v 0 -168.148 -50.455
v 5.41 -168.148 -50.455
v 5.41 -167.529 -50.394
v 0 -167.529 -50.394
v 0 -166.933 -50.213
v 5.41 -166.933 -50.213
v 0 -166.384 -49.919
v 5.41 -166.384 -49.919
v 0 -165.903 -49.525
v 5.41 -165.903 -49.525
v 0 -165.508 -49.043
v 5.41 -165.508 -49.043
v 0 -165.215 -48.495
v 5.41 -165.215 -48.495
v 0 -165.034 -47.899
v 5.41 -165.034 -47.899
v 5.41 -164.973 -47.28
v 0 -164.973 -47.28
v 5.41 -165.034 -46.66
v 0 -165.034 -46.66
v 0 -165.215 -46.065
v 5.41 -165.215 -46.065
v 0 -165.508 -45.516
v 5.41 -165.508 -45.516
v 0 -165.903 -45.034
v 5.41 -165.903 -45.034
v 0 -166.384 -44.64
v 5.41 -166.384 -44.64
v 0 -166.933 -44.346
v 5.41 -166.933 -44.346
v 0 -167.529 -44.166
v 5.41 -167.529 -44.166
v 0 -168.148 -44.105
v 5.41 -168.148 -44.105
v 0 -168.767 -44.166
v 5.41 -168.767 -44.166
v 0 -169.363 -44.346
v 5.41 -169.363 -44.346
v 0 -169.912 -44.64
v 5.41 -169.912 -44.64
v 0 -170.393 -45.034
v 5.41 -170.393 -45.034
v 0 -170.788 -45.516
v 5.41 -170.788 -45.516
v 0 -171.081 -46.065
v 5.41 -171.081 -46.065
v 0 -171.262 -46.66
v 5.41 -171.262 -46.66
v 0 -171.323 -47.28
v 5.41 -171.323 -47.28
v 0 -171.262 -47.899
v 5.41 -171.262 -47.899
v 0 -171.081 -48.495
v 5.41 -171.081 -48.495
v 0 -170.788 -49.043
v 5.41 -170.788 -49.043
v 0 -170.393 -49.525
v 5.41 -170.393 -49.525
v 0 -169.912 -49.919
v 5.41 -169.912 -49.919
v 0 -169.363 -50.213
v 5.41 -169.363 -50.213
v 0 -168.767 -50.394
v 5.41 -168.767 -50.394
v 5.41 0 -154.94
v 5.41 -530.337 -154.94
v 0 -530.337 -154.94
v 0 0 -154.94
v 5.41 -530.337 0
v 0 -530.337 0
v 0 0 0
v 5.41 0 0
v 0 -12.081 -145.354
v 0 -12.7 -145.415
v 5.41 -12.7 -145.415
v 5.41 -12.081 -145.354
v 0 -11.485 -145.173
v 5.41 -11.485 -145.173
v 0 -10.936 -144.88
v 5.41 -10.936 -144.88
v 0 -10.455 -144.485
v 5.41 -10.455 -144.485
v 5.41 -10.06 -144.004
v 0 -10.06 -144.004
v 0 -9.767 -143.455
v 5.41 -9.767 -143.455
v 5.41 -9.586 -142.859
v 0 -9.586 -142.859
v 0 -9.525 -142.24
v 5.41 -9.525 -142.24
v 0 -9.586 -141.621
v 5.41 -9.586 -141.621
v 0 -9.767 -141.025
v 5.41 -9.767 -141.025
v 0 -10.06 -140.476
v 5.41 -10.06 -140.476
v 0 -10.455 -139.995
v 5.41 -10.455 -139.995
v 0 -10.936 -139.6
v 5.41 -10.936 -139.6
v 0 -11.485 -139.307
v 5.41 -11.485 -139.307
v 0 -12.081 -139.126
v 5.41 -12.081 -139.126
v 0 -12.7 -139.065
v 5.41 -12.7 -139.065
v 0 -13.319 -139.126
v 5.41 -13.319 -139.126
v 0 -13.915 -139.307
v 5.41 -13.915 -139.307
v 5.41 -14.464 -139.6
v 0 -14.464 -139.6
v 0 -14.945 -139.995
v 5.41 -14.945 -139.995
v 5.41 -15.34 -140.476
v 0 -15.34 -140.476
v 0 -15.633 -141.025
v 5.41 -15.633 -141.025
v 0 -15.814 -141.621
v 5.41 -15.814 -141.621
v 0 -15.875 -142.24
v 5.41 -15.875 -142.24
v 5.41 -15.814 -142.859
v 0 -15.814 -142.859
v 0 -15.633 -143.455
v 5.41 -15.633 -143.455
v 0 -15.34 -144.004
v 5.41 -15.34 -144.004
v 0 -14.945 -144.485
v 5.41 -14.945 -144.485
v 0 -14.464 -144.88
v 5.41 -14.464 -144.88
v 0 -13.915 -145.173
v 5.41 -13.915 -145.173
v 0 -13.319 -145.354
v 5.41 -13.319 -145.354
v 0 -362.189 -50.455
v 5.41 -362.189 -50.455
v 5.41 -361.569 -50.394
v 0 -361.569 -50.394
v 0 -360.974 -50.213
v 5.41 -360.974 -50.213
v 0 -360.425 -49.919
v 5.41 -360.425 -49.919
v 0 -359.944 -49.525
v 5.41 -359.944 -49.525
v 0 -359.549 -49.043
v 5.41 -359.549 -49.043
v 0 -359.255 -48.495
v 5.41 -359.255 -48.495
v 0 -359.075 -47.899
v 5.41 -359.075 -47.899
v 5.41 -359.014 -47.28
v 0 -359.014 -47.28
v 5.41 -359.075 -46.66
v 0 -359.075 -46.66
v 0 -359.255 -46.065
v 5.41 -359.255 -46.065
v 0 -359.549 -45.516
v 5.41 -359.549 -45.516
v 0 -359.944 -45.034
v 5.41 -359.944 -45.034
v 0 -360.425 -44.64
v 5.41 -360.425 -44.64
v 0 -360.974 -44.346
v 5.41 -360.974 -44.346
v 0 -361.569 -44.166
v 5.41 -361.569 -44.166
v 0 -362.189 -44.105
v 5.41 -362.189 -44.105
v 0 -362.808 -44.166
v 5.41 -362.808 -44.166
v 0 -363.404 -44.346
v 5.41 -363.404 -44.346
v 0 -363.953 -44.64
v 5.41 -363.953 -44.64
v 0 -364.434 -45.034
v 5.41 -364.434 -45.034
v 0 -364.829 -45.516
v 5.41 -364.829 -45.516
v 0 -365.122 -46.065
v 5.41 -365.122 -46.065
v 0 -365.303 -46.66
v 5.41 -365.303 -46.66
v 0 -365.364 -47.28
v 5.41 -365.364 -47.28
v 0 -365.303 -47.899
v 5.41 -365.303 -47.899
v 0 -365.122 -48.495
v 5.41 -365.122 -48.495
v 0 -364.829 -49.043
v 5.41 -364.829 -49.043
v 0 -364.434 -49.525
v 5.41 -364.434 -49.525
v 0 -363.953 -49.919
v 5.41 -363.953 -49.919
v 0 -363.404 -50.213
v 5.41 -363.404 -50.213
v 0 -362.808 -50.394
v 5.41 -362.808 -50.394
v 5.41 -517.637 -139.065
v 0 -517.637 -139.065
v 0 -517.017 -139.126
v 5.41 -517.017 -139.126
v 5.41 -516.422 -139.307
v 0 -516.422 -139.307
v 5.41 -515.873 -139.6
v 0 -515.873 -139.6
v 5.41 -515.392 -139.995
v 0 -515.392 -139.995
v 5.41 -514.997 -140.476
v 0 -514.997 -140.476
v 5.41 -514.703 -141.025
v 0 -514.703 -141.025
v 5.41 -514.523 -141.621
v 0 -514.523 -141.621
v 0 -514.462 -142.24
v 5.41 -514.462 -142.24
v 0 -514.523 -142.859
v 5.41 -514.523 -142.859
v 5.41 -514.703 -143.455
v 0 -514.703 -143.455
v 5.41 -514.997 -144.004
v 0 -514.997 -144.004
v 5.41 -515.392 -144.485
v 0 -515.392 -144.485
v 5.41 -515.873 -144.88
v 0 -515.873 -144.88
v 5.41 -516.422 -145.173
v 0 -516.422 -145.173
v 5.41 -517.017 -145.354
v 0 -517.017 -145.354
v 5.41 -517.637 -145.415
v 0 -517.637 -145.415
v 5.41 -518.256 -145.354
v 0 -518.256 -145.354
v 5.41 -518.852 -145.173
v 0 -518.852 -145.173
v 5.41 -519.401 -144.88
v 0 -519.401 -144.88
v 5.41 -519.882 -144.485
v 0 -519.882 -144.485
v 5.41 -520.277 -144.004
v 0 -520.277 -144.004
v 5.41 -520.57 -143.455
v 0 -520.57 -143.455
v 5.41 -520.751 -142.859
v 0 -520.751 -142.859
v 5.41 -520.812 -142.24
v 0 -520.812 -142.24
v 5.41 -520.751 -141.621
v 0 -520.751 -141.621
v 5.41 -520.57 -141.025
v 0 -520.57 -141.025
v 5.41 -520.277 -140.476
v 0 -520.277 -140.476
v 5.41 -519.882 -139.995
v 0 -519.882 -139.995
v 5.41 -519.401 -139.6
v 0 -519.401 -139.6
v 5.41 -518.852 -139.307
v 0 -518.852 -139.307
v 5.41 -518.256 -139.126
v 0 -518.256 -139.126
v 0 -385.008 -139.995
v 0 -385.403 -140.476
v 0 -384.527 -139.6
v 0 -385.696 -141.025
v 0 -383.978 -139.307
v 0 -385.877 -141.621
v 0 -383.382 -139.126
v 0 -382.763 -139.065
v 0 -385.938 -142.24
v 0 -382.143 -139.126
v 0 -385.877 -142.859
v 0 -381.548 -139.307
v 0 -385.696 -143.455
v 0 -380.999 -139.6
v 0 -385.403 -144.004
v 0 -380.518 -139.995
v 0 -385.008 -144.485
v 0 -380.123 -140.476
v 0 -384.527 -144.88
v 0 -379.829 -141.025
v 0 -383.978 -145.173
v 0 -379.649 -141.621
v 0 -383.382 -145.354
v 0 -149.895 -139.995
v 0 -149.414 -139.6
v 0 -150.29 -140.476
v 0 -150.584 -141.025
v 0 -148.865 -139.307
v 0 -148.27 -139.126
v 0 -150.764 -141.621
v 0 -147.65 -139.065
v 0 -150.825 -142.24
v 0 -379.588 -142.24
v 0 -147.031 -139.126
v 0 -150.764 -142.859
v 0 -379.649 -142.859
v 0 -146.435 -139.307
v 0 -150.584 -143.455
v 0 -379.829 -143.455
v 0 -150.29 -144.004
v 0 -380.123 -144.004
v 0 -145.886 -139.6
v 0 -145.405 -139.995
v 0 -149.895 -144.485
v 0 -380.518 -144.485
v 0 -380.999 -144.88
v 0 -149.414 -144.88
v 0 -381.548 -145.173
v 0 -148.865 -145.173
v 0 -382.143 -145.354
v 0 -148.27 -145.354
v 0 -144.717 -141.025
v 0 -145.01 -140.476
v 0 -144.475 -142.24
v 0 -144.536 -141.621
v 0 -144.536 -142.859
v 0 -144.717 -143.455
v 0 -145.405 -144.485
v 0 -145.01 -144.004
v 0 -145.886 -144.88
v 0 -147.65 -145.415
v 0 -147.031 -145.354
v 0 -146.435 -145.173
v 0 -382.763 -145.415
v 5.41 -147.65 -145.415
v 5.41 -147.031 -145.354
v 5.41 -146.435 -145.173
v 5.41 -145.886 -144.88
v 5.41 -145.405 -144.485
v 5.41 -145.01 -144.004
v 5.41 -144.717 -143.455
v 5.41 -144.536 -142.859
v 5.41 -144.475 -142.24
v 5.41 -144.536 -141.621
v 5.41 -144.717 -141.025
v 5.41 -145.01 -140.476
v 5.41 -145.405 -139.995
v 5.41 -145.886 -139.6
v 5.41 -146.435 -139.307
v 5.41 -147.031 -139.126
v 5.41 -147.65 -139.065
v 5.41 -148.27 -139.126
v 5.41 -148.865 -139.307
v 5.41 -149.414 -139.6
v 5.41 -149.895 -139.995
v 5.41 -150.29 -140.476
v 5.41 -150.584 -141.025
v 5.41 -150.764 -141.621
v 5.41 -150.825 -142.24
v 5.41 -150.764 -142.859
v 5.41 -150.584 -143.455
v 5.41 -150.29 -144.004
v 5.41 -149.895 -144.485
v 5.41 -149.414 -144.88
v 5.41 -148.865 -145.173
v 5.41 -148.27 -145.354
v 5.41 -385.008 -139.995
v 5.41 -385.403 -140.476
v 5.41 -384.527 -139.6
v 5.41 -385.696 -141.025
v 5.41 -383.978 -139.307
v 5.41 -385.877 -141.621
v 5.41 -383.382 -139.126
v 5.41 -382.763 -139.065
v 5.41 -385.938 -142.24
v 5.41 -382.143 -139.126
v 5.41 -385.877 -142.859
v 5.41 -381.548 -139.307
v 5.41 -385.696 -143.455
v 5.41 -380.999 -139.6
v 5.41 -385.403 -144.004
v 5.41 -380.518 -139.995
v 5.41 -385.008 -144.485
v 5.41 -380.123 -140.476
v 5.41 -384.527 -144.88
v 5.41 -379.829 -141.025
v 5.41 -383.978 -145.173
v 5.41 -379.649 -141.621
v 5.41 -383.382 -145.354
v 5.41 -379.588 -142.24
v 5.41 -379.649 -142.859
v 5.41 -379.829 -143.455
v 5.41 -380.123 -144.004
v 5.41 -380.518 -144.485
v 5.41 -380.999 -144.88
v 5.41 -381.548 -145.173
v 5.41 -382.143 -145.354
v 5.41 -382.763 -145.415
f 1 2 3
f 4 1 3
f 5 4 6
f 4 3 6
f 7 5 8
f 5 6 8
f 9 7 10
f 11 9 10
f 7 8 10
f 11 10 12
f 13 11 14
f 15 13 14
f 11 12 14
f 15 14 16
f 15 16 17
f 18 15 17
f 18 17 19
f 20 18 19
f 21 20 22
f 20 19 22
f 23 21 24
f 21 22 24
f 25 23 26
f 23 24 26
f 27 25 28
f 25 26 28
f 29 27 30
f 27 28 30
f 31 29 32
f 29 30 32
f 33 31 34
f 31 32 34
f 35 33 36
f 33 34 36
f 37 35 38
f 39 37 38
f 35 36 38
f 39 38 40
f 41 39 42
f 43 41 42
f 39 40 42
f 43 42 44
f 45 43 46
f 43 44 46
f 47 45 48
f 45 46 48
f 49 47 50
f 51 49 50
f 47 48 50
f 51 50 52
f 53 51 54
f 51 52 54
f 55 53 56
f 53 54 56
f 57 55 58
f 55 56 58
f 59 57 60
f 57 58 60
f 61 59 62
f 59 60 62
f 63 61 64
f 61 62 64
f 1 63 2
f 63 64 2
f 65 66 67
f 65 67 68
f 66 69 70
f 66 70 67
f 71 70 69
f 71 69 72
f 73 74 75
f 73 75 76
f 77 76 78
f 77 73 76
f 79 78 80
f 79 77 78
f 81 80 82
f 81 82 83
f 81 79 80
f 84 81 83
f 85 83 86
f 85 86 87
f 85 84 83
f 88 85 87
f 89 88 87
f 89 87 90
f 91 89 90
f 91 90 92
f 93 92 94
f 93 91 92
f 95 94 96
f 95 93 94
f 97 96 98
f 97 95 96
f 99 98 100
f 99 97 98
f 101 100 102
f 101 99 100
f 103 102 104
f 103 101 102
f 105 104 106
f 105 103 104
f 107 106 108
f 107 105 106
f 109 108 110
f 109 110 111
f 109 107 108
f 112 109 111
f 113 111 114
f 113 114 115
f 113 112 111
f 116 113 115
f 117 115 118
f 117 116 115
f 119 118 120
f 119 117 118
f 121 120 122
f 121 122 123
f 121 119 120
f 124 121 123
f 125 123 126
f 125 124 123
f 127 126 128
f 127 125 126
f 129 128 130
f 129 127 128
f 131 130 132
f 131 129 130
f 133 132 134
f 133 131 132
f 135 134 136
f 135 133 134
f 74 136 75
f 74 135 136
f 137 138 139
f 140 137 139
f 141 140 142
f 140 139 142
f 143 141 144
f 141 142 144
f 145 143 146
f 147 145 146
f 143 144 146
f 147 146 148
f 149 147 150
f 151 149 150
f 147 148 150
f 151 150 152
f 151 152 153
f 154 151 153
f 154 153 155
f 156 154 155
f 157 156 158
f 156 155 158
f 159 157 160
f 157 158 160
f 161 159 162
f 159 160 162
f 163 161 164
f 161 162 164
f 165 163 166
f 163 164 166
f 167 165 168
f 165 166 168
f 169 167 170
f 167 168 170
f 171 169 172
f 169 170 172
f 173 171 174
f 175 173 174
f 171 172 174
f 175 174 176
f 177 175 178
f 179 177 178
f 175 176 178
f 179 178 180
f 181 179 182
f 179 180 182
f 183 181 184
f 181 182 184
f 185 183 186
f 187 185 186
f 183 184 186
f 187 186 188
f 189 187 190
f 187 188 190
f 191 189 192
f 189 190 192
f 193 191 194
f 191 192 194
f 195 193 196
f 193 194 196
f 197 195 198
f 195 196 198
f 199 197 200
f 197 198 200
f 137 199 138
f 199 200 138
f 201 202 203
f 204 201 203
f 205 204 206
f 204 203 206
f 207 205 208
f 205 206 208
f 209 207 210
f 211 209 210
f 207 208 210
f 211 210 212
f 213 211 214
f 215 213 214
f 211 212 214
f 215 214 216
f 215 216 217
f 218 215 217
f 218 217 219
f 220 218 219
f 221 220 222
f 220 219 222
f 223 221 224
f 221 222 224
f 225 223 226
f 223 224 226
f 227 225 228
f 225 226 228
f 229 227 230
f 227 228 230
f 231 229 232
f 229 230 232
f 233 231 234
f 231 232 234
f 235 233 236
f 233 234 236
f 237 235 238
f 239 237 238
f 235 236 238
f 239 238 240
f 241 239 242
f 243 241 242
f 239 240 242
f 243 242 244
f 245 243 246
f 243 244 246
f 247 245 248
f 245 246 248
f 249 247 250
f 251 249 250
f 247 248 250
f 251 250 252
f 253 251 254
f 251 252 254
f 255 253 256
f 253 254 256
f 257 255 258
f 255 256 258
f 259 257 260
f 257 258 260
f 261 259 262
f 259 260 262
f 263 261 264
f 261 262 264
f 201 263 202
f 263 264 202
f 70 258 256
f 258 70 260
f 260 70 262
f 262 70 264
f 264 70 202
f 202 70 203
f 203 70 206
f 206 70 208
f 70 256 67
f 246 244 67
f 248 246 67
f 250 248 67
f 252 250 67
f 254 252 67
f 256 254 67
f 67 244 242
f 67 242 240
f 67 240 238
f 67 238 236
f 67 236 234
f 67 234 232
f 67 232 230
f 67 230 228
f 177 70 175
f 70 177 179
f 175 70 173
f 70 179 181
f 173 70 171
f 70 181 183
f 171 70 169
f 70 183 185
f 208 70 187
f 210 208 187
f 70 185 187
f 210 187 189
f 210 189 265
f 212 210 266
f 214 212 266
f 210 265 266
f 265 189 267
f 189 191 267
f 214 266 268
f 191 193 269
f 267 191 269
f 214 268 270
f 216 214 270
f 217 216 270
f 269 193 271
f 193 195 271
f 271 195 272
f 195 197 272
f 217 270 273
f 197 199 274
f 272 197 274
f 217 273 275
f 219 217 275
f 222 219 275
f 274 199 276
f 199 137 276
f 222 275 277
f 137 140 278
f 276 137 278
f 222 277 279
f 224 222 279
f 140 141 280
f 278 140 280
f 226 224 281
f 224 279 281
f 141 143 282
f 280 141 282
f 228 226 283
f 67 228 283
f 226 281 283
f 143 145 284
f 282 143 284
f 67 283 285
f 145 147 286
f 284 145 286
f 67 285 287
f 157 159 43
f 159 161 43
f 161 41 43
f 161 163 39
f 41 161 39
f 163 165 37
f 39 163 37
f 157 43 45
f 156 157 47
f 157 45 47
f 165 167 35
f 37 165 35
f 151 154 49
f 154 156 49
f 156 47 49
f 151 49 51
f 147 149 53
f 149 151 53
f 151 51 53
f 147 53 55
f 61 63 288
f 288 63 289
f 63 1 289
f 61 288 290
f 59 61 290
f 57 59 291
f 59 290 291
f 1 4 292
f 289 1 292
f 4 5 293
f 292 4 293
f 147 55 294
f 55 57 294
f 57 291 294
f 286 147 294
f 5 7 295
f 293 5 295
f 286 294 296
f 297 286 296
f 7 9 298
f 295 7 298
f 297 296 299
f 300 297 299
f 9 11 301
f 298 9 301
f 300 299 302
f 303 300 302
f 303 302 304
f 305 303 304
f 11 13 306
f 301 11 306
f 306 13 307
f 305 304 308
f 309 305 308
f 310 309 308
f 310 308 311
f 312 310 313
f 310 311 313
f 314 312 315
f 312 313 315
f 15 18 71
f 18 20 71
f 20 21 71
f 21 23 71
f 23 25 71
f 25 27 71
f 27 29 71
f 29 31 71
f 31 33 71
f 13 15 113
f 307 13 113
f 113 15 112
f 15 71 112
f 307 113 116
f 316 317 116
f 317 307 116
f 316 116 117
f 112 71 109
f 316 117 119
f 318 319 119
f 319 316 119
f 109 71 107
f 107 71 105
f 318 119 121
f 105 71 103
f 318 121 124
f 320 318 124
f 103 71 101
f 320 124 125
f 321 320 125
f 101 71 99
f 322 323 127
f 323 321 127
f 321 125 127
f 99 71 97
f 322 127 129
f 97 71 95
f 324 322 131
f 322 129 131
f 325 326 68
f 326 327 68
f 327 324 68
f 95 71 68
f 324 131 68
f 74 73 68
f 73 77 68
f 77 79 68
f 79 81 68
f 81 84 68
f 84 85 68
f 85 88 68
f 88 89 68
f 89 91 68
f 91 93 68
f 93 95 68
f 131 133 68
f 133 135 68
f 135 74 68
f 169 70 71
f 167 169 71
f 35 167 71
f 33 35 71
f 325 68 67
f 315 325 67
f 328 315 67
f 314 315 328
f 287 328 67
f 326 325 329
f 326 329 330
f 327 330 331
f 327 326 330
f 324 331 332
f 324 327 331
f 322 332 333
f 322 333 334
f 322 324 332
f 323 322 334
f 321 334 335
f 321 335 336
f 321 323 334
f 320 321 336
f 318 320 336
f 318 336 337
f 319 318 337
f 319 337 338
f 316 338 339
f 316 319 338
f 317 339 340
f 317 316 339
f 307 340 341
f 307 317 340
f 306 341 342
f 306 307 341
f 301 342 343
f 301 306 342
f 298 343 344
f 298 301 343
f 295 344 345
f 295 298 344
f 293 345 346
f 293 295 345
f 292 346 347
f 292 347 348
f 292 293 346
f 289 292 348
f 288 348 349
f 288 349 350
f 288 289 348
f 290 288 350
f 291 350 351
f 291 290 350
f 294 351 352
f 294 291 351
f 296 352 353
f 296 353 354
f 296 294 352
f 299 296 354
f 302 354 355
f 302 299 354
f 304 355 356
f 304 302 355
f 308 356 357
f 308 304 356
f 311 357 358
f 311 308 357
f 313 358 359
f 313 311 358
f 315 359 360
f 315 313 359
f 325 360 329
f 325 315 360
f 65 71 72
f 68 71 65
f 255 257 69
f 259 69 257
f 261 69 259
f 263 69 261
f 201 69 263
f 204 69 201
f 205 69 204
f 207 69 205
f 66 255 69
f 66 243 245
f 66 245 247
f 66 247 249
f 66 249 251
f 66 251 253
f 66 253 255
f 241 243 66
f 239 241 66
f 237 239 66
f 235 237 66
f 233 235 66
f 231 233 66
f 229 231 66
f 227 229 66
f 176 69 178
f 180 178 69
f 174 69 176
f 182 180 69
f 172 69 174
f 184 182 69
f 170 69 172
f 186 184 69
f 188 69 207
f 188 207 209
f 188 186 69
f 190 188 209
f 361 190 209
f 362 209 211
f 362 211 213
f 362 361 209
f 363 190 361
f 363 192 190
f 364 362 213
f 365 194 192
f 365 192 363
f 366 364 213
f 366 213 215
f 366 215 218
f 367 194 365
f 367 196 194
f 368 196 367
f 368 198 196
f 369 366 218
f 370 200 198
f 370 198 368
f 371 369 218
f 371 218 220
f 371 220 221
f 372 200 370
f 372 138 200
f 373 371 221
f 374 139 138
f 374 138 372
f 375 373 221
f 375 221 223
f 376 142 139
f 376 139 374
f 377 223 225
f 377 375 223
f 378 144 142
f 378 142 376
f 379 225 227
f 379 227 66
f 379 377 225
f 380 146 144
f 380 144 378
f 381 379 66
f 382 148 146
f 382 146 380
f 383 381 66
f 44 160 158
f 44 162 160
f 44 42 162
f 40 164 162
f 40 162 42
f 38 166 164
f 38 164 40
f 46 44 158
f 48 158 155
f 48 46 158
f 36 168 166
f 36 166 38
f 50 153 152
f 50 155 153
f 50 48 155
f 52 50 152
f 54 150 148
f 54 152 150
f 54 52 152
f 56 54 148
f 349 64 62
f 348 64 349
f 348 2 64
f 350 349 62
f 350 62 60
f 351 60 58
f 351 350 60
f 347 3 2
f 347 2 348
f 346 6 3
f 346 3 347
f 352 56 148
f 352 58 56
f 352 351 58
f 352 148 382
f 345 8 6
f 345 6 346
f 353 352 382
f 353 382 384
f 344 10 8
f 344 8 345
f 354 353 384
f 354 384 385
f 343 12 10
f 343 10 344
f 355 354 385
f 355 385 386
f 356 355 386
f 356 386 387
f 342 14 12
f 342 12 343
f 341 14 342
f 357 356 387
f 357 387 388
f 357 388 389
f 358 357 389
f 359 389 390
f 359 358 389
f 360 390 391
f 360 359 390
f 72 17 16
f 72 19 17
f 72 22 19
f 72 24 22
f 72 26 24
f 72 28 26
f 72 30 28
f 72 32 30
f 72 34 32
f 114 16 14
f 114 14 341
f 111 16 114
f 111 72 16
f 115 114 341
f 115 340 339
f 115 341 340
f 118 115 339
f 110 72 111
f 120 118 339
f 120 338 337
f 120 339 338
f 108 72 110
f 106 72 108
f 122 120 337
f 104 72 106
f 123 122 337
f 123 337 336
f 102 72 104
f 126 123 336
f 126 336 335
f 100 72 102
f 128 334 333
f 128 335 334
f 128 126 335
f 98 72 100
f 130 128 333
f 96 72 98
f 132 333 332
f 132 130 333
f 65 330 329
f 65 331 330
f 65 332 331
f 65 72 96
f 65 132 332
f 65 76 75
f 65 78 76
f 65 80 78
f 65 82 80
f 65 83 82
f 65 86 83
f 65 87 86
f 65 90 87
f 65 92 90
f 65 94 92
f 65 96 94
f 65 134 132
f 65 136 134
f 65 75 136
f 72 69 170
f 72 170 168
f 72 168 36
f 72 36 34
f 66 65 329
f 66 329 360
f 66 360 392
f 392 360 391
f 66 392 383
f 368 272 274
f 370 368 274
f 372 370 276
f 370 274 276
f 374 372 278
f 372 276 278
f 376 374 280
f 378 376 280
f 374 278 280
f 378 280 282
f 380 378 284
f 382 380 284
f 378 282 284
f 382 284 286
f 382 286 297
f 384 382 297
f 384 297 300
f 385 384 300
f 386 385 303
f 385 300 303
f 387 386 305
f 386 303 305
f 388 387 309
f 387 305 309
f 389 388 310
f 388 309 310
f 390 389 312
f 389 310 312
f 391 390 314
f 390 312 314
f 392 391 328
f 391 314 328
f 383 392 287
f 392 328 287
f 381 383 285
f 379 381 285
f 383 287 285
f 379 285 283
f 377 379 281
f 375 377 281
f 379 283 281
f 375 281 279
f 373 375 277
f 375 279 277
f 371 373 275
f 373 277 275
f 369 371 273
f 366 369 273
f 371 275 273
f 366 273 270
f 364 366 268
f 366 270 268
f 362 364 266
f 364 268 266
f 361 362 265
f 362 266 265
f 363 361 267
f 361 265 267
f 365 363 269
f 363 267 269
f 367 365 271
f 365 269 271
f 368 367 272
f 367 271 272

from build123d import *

# Parameters (mm, degrees)
SKETCH1_W           = 163.28644
SKETCH1_H           = 160.3502
SKETCH1_R           = 3.175
BOSS_EXTRUDE3_DEPTH = 5.4102
SKETCH5_W           = 163.28644
SKETCH5_H           = 369.98656
SKETCH5_R           = 3.175
BOSS_EXTRUDE7_DEPTH = 5.4102
SKETCH6_W           = 8.34644
SKETCH6_H           = 530.33676
CUT_EXTRUDE1_DEPTH  = 5.4102
SKETCH7_R           = 3.175
CUT_EXTRUDE2_DEPTH  = 5.4102


with BuildPart() as part:
    # Sketch1 → Boss-Extrude3 (new body)
    with BuildSketch(Plane(origin=(0, 0, 0), x_dir=(0, 0, -1), z_dir=(1, 0, 0))):
        with Locations((73.29678, -80.1751)):
            Rectangle(SKETCH1_W, SKETCH1_H)
        with Locations((142.24, -147.6502)):
            Circle(SKETCH1_R, mode=Mode.SUBTRACT)
        with Locations((142.24, -12.7)):
            Circle(SKETCH1_R, mode=Mode.SUBTRACT)
    extrude(amount=BOSS_EXTRUDE3_DEPTH)

    # Sketch5 → Boss-Extrude7 (add)
    with BuildSketch(Plane(origin=(5.4102, 0, 0), x_dir=(0, 0, -1), z_dir=(1, 0, 0))):
        with Locations((73.29678, -345.34348)):
            Rectangle(SKETCH5_W, SKETCH5_H)
        with Locations((47.27956, -362.18876)):
            Circle(SKETCH5_R, mode=Mode.SUBTRACT)
        with Locations((47.27956, -168.148)):
            Circle(SKETCH5_R, mode=Mode.SUBTRACT)
    extrude(amount=-BOSS_EXTRUDE7_DEPTH)

    # Sketch6 → Cut-Extrude1 (cut)
    with BuildSketch(Plane.ZY):
        with Locations((4.17322, -265.16838)):
            Rectangle(SKETCH6_W, SKETCH6_H)
    extrude(amount=-CUT_EXTRUDE1_DEPTH, mode=Mode.SUBTRACT)

    # Sketch7 → Cut-Extrude2 (cut)
    with BuildSketch(Plane.ZY):
        with Locations((-142.24, -517.63676)):
            Circle(SKETCH7_R)
        with Locations((-142.24, -382.76276)):
            Circle(SKETCH7_R)
    extrude(amount=-CUT_EXTRUDE2_DEPTH, mode=Mode.SUBTRACT)


solid = part.part
